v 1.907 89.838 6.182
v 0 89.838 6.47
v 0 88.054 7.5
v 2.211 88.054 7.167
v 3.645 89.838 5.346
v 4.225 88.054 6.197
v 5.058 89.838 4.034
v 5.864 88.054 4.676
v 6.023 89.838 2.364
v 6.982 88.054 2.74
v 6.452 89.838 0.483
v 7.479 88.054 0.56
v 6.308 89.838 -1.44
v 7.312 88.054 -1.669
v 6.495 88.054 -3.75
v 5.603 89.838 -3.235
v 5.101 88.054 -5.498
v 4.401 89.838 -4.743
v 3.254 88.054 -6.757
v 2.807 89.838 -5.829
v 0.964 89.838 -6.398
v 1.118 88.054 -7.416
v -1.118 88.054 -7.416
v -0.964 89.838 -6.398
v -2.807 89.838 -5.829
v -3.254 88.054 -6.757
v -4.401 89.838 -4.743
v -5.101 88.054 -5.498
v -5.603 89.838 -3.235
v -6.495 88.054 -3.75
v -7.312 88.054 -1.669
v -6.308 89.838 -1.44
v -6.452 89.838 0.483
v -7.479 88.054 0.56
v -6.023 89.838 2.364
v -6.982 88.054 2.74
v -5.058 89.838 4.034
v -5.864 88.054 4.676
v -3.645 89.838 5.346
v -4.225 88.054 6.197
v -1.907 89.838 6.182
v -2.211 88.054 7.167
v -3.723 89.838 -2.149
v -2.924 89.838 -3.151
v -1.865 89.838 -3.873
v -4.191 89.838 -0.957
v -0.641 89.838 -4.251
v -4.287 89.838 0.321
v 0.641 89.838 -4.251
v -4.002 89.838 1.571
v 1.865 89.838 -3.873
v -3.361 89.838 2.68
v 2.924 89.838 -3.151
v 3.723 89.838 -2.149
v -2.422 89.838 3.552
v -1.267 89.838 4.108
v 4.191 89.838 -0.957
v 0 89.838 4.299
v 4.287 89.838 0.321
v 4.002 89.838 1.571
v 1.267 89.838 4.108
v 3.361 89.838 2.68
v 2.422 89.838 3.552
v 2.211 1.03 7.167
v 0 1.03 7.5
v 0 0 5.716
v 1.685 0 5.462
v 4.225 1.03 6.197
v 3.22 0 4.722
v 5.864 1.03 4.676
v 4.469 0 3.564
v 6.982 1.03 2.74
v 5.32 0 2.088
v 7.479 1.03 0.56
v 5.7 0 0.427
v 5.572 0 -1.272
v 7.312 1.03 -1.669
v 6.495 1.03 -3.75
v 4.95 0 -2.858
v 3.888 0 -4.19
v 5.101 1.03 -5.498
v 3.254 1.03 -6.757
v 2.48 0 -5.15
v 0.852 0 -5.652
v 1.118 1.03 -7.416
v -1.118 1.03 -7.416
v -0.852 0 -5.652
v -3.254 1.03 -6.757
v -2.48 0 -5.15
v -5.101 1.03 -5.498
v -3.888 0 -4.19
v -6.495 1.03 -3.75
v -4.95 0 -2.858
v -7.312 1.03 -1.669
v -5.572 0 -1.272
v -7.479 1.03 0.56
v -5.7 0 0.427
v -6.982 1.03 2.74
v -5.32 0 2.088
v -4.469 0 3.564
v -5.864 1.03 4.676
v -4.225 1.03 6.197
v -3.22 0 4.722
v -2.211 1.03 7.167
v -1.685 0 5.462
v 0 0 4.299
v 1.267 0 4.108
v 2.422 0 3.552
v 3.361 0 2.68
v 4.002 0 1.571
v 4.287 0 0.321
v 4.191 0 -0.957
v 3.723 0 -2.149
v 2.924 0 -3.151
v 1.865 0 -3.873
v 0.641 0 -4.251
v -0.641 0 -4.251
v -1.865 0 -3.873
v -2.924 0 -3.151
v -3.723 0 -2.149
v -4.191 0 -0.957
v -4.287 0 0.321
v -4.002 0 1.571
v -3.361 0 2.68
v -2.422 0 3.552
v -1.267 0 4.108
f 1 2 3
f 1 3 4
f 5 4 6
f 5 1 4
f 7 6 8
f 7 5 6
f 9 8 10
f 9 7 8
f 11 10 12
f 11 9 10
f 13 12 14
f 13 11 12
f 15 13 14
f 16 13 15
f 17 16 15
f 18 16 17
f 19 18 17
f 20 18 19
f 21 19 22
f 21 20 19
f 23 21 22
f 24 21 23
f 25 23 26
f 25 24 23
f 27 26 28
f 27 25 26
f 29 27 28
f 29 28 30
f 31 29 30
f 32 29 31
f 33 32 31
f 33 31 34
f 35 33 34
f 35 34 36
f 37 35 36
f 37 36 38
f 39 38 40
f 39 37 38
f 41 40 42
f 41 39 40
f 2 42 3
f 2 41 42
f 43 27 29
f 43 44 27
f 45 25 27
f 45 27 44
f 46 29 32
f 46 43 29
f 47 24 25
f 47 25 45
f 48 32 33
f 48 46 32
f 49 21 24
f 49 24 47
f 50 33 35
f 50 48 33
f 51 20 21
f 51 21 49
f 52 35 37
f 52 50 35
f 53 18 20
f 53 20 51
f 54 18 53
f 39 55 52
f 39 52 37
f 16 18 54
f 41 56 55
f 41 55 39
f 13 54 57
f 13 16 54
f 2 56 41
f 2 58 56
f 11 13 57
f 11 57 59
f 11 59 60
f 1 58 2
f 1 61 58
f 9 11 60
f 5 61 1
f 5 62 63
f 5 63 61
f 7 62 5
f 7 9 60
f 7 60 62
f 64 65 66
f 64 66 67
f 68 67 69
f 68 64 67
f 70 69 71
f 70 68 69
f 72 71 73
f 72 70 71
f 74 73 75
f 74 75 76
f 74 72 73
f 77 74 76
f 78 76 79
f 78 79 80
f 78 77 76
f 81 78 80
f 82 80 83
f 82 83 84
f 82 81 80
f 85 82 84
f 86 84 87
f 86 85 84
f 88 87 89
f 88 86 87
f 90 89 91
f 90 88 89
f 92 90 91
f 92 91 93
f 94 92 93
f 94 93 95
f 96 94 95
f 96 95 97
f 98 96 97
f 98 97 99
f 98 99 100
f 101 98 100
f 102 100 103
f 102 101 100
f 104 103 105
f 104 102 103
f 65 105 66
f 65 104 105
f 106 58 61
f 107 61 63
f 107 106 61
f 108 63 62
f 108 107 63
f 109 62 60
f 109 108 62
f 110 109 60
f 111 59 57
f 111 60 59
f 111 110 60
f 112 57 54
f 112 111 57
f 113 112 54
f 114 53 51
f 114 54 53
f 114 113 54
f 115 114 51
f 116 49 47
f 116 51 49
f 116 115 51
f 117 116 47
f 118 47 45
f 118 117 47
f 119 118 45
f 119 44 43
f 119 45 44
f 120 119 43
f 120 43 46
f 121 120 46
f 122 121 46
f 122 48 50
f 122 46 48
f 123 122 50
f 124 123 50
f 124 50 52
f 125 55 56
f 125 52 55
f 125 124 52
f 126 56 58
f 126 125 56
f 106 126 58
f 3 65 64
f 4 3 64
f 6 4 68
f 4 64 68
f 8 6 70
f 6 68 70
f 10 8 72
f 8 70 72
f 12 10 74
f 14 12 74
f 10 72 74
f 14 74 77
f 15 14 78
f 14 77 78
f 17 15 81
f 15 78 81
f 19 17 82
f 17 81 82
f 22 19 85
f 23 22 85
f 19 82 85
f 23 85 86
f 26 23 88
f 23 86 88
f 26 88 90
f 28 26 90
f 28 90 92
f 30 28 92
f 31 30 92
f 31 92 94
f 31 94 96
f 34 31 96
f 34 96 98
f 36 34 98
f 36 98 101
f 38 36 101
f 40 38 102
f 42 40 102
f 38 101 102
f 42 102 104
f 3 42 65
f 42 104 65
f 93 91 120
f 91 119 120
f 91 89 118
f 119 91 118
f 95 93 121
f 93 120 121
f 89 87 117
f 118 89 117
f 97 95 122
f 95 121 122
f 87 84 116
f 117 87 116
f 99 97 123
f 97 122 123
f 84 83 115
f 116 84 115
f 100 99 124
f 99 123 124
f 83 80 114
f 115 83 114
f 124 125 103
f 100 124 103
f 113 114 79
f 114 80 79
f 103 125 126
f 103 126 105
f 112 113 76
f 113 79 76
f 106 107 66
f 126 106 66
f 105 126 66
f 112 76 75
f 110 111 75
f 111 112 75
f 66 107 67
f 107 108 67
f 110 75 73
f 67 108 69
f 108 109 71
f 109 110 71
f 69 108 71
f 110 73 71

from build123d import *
from OCP.BRepFilletAPI import BRepFilletAPI_MakeChamfer

# Parameters (mm, degrees)
SKETCH1_R           = 7.5
BOSS_EXTRUDE1_DEPTH = 89.838116211
SKETCH2_R           = 4.298993134
CUT_EXTRUDE1_DEPTH  = 91.462075614
CHAMFER1_SIZE       = 1.784415546
CHAMFER1_SIZE2      = 1.030232796


with BuildPart() as part:
    # Sketch1 → Boss-Extrude1 (new body)
    with BuildSketch(Plane(origin=(0, 0, 0), x_dir=(1, 0, 0), z_dir=(0, 1, 0))):
        Circle(SKETCH1_R)
    extrude(amount=BOSS_EXTRUDE1_DEPTH)

    # Sketch2 → Cut-Extrude1 (cut, through all)
    with BuildSketch(Plane(origin=(0, 0, 0), x_dir=(1, 0, 0), z_dir=(0, 1, 0))):
        Circle(SKETCH2_R)
    extrude(amount=CUT_EXTRUDE1_DEPTH, mode=Mode.SUBTRACT)

    # Chamfer1: one chamfer whose edges measure the first distance from different faces: ONE call of the kernel's chamfer builder (chamfer() names one face for all edges)
    chamfer1_edges_1 = [part.edges().sort_by_distance(p)[0] for p in [
        (-7.5, 89.838116211, 0),
    ]]
    chamfer1_side_1 = [part.faces().sort_by_distance(p)[0] for p in [
        (-7.5, 44.919058105, 0),
    ]]
    chamfer1_edges_2 = [part.edges().sort_by_distance(p)[0] for p in [
        (-7.5, 0, 0),
    ]]
    chamfer1_side_2 = [part.faces().sort_by_distance(p)[0] for p in [
        (-7.287867966, 0, 0),
    ]]
    chamfer1 = BRepFilletAPI_MakeChamfer(part.part.solid().wrapped)
    for e in chamfer1_edges_1:
        chamfer1.Add(CHAMFER1_SIZE, CHAMFER1_SIZE2, e.wrapped, chamfer1_side_1[0].wrapped)  # the first distance lies on this face
    for e in chamfer1_edges_2:
        chamfer1.Add(CHAMFER1_SIZE, CHAMFER1_SIZE2, e.wrapped, chamfer1_side_2[0].wrapped)  # the first distance lies on this face
    add(Compound.cast(chamfer1.Shape()), mode=Mode.REPLACE)


solid = part.part
